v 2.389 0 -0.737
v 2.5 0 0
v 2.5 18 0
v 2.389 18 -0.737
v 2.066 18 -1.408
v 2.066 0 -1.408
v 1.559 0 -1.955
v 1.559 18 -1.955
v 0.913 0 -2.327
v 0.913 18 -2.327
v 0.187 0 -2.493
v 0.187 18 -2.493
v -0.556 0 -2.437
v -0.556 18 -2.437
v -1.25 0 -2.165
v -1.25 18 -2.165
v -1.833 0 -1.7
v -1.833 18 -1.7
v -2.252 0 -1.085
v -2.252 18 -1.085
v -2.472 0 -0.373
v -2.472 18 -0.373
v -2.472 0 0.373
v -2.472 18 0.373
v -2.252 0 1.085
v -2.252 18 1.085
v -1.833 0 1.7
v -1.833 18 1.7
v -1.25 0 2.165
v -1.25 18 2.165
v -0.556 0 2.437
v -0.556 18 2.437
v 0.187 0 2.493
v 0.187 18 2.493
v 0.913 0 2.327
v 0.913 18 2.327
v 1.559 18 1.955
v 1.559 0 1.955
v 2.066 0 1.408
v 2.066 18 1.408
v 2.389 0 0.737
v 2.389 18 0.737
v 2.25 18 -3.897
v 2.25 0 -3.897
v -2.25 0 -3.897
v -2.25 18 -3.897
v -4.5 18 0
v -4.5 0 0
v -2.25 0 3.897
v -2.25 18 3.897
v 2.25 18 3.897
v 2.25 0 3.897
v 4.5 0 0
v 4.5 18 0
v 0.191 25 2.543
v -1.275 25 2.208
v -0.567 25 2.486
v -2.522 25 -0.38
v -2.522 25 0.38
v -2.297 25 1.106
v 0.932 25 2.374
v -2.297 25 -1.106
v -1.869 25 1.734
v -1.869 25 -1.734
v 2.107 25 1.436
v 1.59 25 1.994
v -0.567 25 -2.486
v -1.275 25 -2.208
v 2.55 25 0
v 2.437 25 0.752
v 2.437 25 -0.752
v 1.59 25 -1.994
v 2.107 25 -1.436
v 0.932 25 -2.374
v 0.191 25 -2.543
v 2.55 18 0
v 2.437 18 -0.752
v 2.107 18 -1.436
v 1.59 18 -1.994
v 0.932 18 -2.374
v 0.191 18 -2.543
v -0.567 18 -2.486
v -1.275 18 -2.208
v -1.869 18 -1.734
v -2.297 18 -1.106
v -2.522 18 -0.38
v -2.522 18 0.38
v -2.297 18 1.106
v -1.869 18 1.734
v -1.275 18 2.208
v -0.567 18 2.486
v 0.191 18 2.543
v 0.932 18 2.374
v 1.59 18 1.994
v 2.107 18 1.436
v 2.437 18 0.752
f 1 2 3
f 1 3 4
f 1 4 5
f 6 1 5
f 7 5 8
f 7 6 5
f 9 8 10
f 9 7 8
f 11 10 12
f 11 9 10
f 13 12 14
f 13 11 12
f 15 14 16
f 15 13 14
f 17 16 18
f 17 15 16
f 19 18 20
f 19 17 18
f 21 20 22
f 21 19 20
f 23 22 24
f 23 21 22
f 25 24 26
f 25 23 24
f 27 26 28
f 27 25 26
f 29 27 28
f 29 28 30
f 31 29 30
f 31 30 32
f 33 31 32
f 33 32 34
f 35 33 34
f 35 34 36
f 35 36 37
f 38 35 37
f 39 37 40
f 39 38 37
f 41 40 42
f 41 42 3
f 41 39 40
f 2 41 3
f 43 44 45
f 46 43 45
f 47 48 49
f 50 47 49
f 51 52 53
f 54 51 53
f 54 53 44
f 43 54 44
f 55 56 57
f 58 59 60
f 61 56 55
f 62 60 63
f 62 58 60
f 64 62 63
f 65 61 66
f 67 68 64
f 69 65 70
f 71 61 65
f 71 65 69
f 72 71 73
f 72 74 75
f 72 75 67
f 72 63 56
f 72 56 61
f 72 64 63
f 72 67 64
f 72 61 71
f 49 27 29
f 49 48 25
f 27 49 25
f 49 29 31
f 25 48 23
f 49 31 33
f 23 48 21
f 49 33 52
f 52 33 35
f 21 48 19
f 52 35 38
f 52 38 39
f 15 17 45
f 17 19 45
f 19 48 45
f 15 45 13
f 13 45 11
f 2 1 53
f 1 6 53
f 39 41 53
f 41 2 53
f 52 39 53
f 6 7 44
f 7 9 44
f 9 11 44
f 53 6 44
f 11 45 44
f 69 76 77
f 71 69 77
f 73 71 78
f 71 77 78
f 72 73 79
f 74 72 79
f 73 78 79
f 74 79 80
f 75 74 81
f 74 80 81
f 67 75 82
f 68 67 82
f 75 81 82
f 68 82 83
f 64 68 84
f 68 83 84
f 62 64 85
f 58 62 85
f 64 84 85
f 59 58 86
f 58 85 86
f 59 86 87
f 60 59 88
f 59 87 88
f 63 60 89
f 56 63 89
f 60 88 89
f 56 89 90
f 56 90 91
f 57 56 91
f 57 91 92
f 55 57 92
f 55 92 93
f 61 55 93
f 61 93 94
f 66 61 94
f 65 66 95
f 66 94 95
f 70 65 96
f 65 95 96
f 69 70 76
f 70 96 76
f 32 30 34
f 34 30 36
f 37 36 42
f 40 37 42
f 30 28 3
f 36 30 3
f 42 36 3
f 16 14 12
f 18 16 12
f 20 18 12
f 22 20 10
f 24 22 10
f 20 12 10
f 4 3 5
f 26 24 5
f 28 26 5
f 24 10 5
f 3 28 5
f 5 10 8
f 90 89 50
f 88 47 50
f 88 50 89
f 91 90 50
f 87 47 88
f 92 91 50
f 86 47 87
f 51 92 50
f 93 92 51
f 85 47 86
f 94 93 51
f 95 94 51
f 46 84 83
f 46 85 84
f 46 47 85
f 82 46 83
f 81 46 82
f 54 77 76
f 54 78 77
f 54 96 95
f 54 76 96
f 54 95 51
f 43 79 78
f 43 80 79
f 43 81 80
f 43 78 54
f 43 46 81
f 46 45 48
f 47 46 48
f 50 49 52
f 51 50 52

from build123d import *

# Parameters (mm, degrees)
SKETCH_1_R      = 2.5
EXTRUDE_1_DEPTH = 18
SKETCH_2_R      = 2.55
EXTRUDE_2_DEPTH = 7


with BuildPart() as part:
    # 草图1 → 凸台-拉伸1 (new body)
    with BuildSketch(Plane(origin=(0, 0, 0), x_dir=(1, 0, 0), z_dir=(0, 1, 0))):
        Polygon((4.5, 0), (2.25, 3.897114317), (-2.25, 3.897114317), (-4.5, 0), (-2.25, -3.897114317), (2.25, -3.897114317), align=None)
        Circle(SKETCH_1_R, mode=Mode.SUBTRACT)
    extrude(amount=EXTRUDE_1_DEPTH)

    # 草图2 → 凸台-拉伸2 (add)
    with BuildSketch(Plane(origin=(0, 18, 0), x_dir=(1, 0, 0), z_dir=(0, 1, 0))):
        Circle(SKETCH_2_R)
    extrude(amount=EXTRUDE_2_DEPTH)


solid = part.part
